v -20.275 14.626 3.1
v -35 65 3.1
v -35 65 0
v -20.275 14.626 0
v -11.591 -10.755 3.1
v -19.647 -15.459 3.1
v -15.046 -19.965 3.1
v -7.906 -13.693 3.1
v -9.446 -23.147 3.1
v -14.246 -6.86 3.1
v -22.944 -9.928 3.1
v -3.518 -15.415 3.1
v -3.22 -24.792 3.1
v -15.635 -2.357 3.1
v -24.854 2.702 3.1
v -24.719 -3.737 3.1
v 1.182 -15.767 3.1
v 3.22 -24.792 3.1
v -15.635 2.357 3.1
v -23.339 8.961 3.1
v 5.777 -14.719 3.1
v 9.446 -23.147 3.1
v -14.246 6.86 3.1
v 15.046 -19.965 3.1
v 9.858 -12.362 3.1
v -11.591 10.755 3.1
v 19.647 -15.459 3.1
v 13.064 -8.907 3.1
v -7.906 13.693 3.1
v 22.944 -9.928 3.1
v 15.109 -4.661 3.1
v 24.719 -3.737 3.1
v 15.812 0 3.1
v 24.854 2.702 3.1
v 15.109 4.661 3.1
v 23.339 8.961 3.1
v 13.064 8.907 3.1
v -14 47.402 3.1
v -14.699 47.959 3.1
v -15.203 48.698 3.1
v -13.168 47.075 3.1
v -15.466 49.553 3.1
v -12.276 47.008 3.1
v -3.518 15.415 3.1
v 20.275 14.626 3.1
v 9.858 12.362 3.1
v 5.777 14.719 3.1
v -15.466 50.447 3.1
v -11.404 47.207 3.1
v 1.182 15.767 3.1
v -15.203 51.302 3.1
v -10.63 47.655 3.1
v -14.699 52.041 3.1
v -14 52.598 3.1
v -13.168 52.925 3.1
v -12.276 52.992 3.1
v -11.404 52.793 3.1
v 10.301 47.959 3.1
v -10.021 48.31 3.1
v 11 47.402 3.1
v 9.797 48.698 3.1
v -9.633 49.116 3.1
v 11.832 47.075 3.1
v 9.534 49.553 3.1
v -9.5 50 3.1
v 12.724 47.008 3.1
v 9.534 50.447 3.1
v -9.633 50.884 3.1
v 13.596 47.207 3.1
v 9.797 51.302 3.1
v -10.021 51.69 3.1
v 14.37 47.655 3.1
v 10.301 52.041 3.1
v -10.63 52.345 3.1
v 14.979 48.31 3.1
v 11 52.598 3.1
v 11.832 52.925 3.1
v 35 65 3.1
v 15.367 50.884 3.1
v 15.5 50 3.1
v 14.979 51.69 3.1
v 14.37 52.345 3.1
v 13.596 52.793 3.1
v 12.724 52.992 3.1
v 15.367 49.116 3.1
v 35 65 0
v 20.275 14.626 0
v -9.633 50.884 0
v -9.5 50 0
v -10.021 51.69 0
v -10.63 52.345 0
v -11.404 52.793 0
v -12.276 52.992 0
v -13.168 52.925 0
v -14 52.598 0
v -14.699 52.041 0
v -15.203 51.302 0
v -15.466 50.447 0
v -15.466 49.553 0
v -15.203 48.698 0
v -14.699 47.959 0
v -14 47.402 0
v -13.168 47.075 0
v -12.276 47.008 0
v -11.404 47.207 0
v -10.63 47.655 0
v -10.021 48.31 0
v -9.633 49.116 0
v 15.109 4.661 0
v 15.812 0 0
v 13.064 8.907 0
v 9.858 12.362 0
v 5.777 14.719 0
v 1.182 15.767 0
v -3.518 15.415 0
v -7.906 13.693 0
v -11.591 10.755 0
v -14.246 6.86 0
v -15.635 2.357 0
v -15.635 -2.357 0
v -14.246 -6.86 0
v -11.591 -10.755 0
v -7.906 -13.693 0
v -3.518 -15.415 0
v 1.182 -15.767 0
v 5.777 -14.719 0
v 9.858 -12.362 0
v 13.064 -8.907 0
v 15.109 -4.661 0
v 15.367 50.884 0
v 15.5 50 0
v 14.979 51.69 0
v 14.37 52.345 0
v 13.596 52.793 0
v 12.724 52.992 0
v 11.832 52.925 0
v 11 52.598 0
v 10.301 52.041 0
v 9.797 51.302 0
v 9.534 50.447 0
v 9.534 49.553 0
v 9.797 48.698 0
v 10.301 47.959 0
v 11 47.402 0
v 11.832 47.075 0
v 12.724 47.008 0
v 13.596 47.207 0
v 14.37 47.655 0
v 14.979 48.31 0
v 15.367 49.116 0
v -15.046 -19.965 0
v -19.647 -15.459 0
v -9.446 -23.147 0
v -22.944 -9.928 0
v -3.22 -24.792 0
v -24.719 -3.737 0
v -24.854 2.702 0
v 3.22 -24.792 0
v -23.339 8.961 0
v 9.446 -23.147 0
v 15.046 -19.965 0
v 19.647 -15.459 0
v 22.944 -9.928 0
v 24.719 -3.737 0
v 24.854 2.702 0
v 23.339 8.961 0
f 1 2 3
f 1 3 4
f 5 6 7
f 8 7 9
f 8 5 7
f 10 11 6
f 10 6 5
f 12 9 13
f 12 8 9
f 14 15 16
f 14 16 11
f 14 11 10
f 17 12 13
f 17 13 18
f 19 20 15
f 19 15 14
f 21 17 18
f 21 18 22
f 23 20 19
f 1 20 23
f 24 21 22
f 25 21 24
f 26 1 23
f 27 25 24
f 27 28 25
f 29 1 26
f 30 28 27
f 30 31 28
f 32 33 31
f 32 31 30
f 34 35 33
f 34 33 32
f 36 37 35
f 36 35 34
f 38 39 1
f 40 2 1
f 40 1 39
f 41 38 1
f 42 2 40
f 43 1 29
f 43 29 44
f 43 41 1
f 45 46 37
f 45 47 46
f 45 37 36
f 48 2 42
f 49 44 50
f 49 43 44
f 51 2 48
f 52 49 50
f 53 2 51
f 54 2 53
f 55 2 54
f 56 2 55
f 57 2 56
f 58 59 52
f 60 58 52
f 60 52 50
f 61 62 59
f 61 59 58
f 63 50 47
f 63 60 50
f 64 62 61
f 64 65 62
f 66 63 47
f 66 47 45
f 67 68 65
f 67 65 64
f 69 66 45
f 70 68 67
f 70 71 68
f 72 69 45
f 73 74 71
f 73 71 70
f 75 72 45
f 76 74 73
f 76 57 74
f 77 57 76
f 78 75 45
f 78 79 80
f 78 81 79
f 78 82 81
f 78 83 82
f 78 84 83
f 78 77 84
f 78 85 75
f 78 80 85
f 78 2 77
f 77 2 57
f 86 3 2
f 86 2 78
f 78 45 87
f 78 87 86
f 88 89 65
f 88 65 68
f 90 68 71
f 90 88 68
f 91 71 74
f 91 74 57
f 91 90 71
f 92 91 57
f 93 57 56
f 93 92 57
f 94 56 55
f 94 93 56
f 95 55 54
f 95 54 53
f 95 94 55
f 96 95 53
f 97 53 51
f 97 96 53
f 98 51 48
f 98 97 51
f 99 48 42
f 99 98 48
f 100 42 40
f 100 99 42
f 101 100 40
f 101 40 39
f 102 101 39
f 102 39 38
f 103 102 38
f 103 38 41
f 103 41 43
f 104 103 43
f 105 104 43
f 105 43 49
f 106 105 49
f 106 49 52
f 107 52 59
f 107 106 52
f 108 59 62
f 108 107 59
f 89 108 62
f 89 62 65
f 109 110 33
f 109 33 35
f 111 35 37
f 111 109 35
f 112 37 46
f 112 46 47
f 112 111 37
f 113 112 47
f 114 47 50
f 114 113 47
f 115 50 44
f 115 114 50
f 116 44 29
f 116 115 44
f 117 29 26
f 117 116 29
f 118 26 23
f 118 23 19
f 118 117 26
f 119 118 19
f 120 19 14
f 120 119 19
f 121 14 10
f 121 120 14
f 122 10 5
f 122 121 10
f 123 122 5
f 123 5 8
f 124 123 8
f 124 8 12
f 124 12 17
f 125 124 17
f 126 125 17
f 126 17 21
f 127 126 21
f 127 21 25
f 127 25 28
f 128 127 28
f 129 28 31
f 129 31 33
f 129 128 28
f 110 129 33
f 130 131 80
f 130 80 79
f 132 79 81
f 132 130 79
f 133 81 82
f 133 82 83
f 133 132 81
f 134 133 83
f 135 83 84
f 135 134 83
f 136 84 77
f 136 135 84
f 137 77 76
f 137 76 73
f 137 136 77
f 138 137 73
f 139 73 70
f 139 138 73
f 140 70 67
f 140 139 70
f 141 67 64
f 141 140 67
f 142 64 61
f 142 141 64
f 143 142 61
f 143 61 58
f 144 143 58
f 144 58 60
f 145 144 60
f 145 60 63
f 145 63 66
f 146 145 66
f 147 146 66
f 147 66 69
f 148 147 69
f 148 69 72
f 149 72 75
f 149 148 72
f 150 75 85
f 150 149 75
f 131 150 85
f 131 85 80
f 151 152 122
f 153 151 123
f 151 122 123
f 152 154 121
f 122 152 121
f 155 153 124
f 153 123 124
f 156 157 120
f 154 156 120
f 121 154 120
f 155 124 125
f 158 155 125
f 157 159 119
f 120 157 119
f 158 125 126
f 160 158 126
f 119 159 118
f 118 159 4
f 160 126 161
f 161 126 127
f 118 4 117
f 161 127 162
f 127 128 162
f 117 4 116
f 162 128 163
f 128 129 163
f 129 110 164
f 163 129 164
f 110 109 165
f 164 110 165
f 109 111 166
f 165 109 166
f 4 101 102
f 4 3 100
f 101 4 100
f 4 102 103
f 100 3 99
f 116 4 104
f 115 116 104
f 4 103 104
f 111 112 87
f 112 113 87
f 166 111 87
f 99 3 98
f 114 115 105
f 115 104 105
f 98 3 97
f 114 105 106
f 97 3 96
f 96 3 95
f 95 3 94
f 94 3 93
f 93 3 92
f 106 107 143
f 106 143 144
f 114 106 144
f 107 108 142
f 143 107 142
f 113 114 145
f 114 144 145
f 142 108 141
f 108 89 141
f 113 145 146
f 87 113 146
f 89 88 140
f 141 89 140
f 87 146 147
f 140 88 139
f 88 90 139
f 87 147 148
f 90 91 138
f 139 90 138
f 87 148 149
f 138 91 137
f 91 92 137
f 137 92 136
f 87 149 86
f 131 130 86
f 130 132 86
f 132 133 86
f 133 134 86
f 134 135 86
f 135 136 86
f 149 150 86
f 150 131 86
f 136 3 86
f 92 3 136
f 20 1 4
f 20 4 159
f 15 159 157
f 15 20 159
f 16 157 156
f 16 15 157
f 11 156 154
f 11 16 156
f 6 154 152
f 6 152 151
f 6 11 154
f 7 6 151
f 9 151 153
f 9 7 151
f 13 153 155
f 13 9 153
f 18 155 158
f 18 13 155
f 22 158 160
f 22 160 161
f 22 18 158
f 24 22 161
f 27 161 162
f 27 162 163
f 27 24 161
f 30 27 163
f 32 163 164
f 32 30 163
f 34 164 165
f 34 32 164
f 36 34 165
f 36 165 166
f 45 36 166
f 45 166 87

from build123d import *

# Parameters (mm, degrees)
SKETCH1_W               = 70
SKETCH1_H               = 100
SKETCH1_R               = 15.8115
SKETCH1_R_2             = 3
BOSS_EXTRUDE1_DEPTH     = 3.1
CUT_EXTRUDE1_DEPTH      = 1
CUT_EXTRUDE1_DEPTH_BACK = 4.1


with BuildPart() as part:
    # Sketch1 → Boss-Extrude1 (new body)
    with BuildSketch(Plane.XY):
        with Locations((0, 15)):
            Rectangle(SKETCH1_W, SKETCH1_H)
        Circle(SKETCH1_R, mode=Mode.SUBTRACT)
        with Locations((-12.5, 50)):
            Circle(SKETCH1_R_2, mode=Mode.SUBTRACT)
        with Locations((12.5, 50)):
            Circle(SKETCH1_R_2, mode=Mode.SUBTRACT)
    extrude(amount=BOSS_EXTRUDE1_DEPTH)

    # Sketch2 → Cut-Extrude1 (cut, two sides)
    with BuildSketch(Plane.XY.offset(3.1)) as cut_extrude1_sk:
        with BuildLine():
            Line((-106.300801708, 308.923795317), (-35, 65))
            Line((-35, 65), (-20.275240011, 14.625821089))
            ThreePointArc((-20.275240011, 14.625821089), (0, -25), (20.275240011, 14.625821089))
            Line((20.275240011, 14.625821089), (35, 65))
            Line((35, 65), (106.300801708, 308.923795317))
            Line((106.300801708, 308.923795317), (106.300801708, -199.338429312))
            Line((106.300801708, -199.338429312), (-106.300801708, -199.338429312))
            Line((-106.300801708, -199.338429312), (-106.300801708, 308.923795317))
        make_face()
    extrude(amount=CUT_EXTRUDE1_DEPTH, mode=Mode.SUBTRACT)
    extrude(cut_extrude1_sk.sketch, amount=-CUT_EXTRUDE1_DEPTH_BACK, mode=Mode.SUBTRACT)


solid = part.part
